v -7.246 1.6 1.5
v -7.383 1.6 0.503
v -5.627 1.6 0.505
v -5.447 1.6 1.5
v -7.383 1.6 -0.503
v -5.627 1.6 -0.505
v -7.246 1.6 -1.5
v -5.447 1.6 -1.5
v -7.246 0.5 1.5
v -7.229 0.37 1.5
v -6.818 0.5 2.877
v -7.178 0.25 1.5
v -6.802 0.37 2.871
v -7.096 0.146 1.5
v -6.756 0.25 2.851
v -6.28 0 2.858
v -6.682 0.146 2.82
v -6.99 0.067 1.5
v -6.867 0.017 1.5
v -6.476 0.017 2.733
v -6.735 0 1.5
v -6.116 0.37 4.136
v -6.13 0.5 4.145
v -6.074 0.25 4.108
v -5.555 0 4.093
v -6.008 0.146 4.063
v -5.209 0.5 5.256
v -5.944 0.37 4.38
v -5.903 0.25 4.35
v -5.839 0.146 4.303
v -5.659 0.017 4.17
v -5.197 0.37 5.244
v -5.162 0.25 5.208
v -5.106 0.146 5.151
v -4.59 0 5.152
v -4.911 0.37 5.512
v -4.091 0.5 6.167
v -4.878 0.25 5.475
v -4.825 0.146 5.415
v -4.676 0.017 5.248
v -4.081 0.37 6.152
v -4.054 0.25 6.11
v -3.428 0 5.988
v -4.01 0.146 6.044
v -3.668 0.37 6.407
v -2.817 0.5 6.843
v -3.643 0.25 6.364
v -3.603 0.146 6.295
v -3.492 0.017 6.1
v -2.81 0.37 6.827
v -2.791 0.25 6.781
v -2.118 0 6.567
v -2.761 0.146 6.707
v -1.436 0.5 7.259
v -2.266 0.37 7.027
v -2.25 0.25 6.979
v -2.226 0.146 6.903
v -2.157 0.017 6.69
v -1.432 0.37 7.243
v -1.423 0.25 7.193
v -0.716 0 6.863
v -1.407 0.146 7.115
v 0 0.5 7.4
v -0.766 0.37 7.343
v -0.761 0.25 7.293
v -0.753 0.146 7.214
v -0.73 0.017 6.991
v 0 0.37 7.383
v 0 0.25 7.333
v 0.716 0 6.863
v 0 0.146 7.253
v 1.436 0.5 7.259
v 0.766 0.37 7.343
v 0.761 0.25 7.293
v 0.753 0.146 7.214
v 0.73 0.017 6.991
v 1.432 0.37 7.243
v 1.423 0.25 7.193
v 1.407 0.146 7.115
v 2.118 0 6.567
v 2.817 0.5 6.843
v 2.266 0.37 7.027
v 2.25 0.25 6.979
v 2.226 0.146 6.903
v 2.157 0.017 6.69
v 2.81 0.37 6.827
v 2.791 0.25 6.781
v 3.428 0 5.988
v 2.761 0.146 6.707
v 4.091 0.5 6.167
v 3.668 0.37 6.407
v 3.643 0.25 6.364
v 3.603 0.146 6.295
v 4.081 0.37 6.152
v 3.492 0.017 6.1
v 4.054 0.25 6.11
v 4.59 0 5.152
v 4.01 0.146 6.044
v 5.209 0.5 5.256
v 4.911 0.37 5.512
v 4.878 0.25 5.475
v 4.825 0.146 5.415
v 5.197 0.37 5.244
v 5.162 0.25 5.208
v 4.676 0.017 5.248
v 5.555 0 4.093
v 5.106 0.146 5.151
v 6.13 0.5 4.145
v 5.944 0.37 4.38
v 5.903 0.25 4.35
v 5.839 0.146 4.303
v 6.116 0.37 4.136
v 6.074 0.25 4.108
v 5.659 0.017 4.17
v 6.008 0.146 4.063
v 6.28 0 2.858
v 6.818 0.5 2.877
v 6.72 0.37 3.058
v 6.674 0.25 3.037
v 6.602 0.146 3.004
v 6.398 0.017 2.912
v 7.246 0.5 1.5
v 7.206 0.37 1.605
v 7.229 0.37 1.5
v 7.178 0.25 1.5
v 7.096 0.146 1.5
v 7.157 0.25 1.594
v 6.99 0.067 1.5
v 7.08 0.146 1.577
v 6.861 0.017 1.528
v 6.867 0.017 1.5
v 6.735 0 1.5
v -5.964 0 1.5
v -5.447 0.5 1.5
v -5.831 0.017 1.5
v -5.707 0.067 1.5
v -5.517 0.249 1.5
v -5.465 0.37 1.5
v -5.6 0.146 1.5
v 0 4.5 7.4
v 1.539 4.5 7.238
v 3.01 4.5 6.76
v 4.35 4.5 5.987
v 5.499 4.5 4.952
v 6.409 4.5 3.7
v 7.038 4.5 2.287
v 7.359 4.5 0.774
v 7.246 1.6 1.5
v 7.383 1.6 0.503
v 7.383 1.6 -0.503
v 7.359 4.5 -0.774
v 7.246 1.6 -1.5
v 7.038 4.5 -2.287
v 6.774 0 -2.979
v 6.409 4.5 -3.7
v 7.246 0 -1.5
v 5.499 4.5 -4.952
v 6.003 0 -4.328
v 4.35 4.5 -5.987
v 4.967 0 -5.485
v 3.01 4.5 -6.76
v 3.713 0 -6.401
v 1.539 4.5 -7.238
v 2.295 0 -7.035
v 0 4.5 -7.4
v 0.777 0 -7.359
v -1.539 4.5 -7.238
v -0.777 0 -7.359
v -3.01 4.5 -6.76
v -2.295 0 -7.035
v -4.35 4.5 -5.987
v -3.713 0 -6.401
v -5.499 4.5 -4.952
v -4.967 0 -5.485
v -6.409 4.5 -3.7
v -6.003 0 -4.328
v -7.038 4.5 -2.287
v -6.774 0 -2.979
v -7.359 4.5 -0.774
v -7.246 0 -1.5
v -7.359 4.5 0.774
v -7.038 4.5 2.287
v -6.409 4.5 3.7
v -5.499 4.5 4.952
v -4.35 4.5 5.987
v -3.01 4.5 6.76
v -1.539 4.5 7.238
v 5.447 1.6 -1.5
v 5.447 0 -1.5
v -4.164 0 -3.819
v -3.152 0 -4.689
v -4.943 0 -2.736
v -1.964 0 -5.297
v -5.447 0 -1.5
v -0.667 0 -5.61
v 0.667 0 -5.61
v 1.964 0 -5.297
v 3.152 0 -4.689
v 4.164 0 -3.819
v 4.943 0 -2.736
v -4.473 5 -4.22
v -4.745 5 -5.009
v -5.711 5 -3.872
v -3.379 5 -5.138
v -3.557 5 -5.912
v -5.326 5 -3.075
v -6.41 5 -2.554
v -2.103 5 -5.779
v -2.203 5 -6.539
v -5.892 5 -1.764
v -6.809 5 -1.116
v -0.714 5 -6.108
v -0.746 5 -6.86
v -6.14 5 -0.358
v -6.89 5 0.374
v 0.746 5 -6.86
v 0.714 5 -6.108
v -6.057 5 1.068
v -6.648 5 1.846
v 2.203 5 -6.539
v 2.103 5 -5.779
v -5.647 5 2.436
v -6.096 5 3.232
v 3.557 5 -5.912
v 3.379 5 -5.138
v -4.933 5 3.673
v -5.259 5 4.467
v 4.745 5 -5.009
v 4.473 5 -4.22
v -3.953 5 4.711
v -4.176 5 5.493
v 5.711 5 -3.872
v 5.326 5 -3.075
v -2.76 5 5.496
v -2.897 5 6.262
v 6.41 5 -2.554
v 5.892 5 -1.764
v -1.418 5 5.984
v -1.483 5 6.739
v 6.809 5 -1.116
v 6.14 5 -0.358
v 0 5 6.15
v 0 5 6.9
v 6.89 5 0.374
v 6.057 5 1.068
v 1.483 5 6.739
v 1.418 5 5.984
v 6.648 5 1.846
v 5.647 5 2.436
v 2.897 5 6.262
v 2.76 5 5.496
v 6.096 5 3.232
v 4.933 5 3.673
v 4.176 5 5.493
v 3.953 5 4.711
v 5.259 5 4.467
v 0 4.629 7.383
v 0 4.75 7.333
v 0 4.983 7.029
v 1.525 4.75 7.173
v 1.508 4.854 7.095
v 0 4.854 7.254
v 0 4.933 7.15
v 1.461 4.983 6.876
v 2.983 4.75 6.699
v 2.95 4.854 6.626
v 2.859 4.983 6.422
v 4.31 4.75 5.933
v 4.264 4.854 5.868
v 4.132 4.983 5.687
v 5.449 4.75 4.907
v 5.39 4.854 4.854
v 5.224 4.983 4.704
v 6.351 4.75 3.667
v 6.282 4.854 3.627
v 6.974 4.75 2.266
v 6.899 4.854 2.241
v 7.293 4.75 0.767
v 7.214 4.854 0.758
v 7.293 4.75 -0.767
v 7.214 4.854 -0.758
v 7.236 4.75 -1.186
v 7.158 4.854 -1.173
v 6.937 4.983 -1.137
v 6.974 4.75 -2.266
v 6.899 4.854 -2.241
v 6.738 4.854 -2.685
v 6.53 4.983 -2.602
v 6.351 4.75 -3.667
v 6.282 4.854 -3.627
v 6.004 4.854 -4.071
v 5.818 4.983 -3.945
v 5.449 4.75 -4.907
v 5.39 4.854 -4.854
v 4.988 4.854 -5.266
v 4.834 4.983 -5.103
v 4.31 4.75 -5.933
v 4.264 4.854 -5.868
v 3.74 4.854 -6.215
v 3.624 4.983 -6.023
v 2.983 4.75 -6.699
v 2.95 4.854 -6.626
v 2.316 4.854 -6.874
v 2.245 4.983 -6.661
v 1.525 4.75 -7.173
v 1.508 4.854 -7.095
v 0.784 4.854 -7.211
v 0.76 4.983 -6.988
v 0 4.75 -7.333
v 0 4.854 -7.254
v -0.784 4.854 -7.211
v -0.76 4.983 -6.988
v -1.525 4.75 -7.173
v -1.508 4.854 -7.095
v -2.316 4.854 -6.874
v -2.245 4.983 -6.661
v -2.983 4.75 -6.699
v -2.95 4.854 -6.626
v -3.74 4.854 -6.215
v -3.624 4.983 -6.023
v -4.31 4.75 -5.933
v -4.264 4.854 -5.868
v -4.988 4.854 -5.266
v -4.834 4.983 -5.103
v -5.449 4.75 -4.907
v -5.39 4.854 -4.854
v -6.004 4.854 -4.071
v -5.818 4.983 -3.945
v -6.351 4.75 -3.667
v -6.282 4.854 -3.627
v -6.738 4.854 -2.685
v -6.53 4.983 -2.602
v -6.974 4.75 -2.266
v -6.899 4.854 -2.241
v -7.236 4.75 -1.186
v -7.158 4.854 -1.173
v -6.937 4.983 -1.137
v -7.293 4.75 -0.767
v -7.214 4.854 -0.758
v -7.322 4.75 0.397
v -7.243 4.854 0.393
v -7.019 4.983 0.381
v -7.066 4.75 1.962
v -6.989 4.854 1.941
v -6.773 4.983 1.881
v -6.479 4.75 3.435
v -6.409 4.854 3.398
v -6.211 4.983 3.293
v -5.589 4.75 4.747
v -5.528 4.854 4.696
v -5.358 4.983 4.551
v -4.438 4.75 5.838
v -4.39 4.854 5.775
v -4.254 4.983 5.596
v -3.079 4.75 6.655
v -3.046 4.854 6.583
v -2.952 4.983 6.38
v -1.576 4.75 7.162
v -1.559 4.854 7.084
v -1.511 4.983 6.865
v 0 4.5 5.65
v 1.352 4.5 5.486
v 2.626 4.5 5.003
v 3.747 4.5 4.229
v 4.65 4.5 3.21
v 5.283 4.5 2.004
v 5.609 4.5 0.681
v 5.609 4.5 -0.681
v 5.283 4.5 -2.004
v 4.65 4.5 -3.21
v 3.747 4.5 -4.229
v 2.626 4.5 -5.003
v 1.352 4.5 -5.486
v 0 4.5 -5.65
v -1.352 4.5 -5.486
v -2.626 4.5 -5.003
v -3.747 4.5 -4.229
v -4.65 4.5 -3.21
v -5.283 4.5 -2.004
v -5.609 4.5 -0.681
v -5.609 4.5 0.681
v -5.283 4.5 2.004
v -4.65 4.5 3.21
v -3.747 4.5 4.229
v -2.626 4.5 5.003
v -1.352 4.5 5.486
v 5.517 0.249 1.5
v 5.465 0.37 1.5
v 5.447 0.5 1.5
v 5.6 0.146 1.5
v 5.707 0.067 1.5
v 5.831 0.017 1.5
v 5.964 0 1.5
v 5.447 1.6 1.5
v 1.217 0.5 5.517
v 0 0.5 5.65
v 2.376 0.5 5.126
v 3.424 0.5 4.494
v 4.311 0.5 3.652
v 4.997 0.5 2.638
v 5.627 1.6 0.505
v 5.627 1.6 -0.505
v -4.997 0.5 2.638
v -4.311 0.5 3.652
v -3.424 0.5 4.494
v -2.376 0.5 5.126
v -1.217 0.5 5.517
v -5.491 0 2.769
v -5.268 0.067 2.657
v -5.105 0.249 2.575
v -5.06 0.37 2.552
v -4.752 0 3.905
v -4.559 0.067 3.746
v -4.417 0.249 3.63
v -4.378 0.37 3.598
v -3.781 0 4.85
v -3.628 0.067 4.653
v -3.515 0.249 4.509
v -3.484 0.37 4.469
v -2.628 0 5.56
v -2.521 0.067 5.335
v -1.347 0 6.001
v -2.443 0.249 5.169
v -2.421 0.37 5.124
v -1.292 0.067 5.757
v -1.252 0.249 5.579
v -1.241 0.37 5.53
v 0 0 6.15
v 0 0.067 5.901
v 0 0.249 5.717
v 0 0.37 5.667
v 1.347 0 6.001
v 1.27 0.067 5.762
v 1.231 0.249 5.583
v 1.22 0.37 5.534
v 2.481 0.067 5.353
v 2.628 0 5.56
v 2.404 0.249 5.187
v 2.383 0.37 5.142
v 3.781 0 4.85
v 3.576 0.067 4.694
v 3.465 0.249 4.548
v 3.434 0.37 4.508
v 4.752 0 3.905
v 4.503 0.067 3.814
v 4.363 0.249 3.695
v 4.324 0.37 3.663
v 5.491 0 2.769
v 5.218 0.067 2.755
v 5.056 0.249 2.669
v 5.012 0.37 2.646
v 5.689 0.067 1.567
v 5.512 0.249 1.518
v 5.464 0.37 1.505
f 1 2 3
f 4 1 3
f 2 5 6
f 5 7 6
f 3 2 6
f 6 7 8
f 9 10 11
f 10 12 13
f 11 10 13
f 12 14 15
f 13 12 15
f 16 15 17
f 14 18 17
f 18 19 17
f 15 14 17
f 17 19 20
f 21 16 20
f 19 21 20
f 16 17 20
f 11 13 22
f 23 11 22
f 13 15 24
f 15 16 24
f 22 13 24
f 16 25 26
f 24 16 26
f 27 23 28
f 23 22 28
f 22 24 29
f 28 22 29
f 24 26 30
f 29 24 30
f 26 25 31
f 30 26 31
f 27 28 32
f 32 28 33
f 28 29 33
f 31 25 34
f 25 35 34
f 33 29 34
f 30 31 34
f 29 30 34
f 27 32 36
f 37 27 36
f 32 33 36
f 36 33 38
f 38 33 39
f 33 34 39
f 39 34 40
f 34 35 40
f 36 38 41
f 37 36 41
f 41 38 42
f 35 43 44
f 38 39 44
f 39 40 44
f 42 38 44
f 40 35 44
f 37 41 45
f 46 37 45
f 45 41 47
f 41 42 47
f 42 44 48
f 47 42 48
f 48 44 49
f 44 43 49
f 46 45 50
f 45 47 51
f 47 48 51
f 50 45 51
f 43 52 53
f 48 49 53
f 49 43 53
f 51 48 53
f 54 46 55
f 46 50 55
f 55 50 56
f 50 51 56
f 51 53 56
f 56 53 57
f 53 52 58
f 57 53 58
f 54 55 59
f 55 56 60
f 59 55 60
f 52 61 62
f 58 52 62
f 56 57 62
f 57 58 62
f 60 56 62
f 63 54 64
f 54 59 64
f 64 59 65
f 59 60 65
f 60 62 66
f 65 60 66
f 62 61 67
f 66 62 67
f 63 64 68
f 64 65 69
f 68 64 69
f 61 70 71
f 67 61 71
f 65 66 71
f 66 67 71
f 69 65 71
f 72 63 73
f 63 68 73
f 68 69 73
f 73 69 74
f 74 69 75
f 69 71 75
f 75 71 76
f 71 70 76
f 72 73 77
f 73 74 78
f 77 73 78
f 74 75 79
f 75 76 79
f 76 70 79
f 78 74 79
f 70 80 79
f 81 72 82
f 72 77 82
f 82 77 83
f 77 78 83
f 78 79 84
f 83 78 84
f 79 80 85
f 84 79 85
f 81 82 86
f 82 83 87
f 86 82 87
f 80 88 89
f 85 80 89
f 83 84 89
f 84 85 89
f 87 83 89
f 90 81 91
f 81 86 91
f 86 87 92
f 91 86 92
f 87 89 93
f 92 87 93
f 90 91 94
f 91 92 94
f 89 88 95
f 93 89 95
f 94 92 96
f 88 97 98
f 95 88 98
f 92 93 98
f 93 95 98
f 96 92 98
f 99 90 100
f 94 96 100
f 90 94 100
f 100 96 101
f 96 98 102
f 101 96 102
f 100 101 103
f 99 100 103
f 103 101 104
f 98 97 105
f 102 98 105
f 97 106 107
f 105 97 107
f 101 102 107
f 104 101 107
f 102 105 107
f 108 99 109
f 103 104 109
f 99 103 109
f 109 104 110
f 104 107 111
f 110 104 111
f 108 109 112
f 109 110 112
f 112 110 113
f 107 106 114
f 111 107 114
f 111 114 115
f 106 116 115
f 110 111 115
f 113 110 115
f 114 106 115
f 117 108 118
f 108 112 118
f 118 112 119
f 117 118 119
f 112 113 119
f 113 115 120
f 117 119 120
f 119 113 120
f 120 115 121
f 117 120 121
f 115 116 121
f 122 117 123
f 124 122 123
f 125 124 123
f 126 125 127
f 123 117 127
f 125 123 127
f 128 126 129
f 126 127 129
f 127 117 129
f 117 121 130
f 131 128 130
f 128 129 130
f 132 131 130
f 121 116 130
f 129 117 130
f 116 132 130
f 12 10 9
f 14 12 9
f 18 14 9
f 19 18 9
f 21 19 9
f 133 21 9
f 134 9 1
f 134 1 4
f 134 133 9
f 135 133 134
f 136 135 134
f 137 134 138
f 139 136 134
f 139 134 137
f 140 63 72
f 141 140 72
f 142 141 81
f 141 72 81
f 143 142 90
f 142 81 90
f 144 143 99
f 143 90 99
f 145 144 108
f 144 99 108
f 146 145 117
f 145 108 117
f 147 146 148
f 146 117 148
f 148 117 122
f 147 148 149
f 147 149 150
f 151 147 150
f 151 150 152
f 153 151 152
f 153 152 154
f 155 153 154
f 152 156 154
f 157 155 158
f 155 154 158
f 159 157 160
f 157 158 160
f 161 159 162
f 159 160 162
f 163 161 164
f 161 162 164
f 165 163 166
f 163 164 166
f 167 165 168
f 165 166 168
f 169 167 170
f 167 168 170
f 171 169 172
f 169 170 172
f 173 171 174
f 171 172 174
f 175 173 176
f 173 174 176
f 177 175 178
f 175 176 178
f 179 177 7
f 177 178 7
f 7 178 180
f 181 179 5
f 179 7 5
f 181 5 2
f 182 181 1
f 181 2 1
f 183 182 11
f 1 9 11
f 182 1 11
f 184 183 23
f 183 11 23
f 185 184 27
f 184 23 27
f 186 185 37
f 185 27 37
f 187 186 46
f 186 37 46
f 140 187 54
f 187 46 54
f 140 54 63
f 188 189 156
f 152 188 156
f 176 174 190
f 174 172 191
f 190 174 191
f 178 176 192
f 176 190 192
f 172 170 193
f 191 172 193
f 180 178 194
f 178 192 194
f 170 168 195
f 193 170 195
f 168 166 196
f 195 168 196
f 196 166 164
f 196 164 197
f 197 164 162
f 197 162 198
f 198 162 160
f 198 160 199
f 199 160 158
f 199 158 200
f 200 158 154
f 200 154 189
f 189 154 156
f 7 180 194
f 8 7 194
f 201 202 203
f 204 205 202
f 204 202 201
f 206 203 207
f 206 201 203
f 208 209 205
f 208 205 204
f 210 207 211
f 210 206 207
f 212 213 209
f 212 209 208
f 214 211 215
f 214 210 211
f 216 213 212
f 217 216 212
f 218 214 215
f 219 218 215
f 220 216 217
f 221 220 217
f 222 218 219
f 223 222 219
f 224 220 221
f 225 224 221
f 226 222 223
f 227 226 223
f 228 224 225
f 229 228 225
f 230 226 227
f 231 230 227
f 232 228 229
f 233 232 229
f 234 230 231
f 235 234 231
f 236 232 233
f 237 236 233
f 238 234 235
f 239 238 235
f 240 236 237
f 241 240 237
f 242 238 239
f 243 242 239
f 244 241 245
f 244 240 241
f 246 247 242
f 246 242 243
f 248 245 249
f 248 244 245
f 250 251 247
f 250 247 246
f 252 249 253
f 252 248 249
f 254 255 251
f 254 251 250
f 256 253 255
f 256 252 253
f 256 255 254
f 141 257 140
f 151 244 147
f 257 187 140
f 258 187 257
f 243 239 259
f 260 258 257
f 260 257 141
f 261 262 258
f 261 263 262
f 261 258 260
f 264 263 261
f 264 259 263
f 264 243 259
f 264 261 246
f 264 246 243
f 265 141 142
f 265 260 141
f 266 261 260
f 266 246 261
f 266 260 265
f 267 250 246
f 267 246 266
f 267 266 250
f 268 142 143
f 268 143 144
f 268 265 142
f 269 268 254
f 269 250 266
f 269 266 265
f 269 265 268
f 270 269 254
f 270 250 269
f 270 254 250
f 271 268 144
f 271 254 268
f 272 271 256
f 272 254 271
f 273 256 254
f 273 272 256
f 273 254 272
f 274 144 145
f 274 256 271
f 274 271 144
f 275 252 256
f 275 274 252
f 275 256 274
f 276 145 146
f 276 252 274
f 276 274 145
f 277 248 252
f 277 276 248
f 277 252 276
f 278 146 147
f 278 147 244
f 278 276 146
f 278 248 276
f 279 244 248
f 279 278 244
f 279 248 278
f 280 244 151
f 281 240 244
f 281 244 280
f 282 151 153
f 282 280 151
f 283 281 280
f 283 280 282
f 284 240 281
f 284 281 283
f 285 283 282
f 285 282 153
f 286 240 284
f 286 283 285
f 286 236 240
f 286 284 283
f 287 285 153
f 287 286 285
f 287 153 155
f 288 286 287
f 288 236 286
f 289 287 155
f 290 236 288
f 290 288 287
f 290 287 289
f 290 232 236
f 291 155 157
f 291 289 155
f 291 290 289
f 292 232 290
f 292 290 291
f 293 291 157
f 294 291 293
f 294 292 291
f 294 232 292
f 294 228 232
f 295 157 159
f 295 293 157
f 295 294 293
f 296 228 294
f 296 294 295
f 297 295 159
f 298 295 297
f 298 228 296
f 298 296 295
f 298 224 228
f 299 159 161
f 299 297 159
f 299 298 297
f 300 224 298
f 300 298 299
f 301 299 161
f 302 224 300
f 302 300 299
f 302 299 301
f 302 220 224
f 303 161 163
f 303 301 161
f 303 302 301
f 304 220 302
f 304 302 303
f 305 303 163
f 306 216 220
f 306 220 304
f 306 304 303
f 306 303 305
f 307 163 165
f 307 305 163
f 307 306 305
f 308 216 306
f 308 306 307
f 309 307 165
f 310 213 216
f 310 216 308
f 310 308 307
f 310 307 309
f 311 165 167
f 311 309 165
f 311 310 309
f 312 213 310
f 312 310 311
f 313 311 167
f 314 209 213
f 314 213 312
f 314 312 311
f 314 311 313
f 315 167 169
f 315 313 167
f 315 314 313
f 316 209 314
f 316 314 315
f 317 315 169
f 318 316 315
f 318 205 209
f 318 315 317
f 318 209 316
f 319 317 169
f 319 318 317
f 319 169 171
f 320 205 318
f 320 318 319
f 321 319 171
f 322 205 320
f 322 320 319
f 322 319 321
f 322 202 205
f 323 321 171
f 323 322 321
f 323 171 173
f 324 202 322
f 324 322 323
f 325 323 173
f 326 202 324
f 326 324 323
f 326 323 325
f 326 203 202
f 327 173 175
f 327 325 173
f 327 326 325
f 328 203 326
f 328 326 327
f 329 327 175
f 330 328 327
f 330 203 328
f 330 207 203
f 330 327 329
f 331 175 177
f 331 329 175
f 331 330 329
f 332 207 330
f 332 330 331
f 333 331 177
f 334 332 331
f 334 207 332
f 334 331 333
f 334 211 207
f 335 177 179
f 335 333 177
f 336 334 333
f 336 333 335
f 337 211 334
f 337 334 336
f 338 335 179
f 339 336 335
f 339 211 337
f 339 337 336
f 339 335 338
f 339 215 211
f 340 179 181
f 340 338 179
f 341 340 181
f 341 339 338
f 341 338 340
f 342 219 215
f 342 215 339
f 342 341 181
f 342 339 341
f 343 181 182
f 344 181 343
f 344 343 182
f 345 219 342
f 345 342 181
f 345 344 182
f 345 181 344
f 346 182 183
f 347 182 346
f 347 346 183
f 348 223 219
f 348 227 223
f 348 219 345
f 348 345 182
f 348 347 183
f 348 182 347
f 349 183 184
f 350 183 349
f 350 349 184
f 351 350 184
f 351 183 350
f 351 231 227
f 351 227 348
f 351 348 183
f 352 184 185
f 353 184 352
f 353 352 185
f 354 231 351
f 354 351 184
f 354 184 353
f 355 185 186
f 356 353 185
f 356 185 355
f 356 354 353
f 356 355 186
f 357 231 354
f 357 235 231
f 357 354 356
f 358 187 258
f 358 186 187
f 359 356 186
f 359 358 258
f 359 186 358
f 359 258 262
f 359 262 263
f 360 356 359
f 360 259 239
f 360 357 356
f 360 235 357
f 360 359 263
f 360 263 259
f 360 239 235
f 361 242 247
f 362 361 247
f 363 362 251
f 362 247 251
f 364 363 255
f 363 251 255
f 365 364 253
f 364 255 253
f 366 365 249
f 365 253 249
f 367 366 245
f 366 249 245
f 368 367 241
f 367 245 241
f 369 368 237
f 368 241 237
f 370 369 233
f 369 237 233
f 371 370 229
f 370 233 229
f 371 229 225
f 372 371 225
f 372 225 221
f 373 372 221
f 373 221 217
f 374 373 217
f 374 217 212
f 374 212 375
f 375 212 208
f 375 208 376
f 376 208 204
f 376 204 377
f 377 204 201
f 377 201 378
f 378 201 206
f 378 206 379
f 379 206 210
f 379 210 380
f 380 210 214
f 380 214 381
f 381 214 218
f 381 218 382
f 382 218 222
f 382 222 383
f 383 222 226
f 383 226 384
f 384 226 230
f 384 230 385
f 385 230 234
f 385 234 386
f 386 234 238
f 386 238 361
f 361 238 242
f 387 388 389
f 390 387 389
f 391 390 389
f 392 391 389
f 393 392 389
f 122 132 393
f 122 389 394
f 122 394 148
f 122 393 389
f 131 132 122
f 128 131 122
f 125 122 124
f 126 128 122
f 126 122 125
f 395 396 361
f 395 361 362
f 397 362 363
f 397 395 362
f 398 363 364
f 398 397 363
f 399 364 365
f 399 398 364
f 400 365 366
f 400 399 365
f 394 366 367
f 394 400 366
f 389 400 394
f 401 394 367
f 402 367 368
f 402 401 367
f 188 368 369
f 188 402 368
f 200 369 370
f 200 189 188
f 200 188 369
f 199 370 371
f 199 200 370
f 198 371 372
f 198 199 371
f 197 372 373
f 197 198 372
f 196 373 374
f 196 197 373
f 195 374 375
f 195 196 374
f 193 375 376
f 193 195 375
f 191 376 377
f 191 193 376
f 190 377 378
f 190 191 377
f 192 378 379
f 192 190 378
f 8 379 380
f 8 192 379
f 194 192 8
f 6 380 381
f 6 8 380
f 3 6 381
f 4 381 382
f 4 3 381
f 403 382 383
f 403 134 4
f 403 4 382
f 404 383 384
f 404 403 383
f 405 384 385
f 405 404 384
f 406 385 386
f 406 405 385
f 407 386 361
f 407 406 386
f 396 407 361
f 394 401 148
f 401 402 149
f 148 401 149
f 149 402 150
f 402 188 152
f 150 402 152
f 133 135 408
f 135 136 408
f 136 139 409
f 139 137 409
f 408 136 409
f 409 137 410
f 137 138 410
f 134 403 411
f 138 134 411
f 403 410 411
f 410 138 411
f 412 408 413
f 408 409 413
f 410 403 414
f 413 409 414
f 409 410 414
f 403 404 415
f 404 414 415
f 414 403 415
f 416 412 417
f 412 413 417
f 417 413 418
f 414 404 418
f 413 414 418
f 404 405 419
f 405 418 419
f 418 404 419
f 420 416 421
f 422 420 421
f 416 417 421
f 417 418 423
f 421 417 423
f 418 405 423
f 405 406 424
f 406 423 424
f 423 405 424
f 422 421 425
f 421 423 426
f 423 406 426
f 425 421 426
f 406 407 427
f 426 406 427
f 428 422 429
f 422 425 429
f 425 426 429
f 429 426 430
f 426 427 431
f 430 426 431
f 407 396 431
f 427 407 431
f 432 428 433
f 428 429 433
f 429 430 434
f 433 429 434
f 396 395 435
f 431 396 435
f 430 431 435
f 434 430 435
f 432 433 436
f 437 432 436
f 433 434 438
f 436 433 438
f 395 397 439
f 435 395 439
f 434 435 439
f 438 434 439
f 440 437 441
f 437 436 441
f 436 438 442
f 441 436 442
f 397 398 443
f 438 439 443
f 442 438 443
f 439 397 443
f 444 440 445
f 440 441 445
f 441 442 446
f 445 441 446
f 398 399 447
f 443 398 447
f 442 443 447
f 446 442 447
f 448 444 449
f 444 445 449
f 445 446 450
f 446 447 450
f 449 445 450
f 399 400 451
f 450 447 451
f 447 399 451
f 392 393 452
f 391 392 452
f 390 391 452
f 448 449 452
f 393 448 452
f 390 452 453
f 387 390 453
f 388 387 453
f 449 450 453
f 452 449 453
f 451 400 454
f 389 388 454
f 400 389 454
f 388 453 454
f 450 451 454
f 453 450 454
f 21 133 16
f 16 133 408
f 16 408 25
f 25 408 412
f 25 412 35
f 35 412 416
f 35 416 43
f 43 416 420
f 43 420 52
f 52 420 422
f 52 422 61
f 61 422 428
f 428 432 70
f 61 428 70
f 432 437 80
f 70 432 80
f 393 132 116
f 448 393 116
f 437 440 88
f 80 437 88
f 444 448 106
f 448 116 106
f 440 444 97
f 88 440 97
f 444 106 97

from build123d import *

# Parameters (mm, degrees)
SKETCH1_R           = 7.4
SKETCH1_R_2         = 5.65
BOSS_EXTRUDE1_DEPTH = 5
SKETCH2_W           = 27.497480526
SKETCH2_H           = 3
CUT_EXTRUDE2_DEPTH  = 1.6
FILLET1_R           = 0.5
CHAMFER1_SIZE       = 0.5


with BuildPart() as part:
    # Sketch1 → Boss-Extrude1 (new body)
    with BuildSketch(Plane(origin=(0, 0, 0), x_dir=(1, 0, 0), z_dir=(0, 1, 0))):
        with Locations(Location((0, 0, 0), (0, 0, 270))):
            Circle(SKETCH1_R)
        with Locations(Location((0, 0, 0), (0, 0, 270))):
            Circle(SKETCH1_R_2, mode=Mode.SUBTRACT)
    extrude(amount=BOSS_EXTRUDE1_DEPTH)

    # Sketch2 → Cut-Extrude2 (cut)
    with BuildSketch(Plane(origin=(0, 0, 0), x_dir=(1, 0, 0), z_dir=(0, 1, 0))):
        Rectangle(SKETCH2_W, SKETCH2_H)
    extrude(amount=CUT_EXTRUDE2_DEPTH, mode=Mode.SUBTRACT)

    # Fillet1
    fillet1_edges = [part.edges().sort_by_distance(p)[0] for p in [
        (-3.423996203, 0, 4.494301948),
        (4.672258554, 0, 5.738466694),
        (0, 5, -7.4),
    ]]
    fillet(fillet1_edges, radius=FILLET1_R)

    # Chamfer1
    chamfer1_edges = [part.edges().sort_by_distance(p)[0] for p in [
        (0, 5, -5.65),
    ]]
    chamfer(chamfer1_edges, length=CHAMFER1_SIZE)


solid = part.part
